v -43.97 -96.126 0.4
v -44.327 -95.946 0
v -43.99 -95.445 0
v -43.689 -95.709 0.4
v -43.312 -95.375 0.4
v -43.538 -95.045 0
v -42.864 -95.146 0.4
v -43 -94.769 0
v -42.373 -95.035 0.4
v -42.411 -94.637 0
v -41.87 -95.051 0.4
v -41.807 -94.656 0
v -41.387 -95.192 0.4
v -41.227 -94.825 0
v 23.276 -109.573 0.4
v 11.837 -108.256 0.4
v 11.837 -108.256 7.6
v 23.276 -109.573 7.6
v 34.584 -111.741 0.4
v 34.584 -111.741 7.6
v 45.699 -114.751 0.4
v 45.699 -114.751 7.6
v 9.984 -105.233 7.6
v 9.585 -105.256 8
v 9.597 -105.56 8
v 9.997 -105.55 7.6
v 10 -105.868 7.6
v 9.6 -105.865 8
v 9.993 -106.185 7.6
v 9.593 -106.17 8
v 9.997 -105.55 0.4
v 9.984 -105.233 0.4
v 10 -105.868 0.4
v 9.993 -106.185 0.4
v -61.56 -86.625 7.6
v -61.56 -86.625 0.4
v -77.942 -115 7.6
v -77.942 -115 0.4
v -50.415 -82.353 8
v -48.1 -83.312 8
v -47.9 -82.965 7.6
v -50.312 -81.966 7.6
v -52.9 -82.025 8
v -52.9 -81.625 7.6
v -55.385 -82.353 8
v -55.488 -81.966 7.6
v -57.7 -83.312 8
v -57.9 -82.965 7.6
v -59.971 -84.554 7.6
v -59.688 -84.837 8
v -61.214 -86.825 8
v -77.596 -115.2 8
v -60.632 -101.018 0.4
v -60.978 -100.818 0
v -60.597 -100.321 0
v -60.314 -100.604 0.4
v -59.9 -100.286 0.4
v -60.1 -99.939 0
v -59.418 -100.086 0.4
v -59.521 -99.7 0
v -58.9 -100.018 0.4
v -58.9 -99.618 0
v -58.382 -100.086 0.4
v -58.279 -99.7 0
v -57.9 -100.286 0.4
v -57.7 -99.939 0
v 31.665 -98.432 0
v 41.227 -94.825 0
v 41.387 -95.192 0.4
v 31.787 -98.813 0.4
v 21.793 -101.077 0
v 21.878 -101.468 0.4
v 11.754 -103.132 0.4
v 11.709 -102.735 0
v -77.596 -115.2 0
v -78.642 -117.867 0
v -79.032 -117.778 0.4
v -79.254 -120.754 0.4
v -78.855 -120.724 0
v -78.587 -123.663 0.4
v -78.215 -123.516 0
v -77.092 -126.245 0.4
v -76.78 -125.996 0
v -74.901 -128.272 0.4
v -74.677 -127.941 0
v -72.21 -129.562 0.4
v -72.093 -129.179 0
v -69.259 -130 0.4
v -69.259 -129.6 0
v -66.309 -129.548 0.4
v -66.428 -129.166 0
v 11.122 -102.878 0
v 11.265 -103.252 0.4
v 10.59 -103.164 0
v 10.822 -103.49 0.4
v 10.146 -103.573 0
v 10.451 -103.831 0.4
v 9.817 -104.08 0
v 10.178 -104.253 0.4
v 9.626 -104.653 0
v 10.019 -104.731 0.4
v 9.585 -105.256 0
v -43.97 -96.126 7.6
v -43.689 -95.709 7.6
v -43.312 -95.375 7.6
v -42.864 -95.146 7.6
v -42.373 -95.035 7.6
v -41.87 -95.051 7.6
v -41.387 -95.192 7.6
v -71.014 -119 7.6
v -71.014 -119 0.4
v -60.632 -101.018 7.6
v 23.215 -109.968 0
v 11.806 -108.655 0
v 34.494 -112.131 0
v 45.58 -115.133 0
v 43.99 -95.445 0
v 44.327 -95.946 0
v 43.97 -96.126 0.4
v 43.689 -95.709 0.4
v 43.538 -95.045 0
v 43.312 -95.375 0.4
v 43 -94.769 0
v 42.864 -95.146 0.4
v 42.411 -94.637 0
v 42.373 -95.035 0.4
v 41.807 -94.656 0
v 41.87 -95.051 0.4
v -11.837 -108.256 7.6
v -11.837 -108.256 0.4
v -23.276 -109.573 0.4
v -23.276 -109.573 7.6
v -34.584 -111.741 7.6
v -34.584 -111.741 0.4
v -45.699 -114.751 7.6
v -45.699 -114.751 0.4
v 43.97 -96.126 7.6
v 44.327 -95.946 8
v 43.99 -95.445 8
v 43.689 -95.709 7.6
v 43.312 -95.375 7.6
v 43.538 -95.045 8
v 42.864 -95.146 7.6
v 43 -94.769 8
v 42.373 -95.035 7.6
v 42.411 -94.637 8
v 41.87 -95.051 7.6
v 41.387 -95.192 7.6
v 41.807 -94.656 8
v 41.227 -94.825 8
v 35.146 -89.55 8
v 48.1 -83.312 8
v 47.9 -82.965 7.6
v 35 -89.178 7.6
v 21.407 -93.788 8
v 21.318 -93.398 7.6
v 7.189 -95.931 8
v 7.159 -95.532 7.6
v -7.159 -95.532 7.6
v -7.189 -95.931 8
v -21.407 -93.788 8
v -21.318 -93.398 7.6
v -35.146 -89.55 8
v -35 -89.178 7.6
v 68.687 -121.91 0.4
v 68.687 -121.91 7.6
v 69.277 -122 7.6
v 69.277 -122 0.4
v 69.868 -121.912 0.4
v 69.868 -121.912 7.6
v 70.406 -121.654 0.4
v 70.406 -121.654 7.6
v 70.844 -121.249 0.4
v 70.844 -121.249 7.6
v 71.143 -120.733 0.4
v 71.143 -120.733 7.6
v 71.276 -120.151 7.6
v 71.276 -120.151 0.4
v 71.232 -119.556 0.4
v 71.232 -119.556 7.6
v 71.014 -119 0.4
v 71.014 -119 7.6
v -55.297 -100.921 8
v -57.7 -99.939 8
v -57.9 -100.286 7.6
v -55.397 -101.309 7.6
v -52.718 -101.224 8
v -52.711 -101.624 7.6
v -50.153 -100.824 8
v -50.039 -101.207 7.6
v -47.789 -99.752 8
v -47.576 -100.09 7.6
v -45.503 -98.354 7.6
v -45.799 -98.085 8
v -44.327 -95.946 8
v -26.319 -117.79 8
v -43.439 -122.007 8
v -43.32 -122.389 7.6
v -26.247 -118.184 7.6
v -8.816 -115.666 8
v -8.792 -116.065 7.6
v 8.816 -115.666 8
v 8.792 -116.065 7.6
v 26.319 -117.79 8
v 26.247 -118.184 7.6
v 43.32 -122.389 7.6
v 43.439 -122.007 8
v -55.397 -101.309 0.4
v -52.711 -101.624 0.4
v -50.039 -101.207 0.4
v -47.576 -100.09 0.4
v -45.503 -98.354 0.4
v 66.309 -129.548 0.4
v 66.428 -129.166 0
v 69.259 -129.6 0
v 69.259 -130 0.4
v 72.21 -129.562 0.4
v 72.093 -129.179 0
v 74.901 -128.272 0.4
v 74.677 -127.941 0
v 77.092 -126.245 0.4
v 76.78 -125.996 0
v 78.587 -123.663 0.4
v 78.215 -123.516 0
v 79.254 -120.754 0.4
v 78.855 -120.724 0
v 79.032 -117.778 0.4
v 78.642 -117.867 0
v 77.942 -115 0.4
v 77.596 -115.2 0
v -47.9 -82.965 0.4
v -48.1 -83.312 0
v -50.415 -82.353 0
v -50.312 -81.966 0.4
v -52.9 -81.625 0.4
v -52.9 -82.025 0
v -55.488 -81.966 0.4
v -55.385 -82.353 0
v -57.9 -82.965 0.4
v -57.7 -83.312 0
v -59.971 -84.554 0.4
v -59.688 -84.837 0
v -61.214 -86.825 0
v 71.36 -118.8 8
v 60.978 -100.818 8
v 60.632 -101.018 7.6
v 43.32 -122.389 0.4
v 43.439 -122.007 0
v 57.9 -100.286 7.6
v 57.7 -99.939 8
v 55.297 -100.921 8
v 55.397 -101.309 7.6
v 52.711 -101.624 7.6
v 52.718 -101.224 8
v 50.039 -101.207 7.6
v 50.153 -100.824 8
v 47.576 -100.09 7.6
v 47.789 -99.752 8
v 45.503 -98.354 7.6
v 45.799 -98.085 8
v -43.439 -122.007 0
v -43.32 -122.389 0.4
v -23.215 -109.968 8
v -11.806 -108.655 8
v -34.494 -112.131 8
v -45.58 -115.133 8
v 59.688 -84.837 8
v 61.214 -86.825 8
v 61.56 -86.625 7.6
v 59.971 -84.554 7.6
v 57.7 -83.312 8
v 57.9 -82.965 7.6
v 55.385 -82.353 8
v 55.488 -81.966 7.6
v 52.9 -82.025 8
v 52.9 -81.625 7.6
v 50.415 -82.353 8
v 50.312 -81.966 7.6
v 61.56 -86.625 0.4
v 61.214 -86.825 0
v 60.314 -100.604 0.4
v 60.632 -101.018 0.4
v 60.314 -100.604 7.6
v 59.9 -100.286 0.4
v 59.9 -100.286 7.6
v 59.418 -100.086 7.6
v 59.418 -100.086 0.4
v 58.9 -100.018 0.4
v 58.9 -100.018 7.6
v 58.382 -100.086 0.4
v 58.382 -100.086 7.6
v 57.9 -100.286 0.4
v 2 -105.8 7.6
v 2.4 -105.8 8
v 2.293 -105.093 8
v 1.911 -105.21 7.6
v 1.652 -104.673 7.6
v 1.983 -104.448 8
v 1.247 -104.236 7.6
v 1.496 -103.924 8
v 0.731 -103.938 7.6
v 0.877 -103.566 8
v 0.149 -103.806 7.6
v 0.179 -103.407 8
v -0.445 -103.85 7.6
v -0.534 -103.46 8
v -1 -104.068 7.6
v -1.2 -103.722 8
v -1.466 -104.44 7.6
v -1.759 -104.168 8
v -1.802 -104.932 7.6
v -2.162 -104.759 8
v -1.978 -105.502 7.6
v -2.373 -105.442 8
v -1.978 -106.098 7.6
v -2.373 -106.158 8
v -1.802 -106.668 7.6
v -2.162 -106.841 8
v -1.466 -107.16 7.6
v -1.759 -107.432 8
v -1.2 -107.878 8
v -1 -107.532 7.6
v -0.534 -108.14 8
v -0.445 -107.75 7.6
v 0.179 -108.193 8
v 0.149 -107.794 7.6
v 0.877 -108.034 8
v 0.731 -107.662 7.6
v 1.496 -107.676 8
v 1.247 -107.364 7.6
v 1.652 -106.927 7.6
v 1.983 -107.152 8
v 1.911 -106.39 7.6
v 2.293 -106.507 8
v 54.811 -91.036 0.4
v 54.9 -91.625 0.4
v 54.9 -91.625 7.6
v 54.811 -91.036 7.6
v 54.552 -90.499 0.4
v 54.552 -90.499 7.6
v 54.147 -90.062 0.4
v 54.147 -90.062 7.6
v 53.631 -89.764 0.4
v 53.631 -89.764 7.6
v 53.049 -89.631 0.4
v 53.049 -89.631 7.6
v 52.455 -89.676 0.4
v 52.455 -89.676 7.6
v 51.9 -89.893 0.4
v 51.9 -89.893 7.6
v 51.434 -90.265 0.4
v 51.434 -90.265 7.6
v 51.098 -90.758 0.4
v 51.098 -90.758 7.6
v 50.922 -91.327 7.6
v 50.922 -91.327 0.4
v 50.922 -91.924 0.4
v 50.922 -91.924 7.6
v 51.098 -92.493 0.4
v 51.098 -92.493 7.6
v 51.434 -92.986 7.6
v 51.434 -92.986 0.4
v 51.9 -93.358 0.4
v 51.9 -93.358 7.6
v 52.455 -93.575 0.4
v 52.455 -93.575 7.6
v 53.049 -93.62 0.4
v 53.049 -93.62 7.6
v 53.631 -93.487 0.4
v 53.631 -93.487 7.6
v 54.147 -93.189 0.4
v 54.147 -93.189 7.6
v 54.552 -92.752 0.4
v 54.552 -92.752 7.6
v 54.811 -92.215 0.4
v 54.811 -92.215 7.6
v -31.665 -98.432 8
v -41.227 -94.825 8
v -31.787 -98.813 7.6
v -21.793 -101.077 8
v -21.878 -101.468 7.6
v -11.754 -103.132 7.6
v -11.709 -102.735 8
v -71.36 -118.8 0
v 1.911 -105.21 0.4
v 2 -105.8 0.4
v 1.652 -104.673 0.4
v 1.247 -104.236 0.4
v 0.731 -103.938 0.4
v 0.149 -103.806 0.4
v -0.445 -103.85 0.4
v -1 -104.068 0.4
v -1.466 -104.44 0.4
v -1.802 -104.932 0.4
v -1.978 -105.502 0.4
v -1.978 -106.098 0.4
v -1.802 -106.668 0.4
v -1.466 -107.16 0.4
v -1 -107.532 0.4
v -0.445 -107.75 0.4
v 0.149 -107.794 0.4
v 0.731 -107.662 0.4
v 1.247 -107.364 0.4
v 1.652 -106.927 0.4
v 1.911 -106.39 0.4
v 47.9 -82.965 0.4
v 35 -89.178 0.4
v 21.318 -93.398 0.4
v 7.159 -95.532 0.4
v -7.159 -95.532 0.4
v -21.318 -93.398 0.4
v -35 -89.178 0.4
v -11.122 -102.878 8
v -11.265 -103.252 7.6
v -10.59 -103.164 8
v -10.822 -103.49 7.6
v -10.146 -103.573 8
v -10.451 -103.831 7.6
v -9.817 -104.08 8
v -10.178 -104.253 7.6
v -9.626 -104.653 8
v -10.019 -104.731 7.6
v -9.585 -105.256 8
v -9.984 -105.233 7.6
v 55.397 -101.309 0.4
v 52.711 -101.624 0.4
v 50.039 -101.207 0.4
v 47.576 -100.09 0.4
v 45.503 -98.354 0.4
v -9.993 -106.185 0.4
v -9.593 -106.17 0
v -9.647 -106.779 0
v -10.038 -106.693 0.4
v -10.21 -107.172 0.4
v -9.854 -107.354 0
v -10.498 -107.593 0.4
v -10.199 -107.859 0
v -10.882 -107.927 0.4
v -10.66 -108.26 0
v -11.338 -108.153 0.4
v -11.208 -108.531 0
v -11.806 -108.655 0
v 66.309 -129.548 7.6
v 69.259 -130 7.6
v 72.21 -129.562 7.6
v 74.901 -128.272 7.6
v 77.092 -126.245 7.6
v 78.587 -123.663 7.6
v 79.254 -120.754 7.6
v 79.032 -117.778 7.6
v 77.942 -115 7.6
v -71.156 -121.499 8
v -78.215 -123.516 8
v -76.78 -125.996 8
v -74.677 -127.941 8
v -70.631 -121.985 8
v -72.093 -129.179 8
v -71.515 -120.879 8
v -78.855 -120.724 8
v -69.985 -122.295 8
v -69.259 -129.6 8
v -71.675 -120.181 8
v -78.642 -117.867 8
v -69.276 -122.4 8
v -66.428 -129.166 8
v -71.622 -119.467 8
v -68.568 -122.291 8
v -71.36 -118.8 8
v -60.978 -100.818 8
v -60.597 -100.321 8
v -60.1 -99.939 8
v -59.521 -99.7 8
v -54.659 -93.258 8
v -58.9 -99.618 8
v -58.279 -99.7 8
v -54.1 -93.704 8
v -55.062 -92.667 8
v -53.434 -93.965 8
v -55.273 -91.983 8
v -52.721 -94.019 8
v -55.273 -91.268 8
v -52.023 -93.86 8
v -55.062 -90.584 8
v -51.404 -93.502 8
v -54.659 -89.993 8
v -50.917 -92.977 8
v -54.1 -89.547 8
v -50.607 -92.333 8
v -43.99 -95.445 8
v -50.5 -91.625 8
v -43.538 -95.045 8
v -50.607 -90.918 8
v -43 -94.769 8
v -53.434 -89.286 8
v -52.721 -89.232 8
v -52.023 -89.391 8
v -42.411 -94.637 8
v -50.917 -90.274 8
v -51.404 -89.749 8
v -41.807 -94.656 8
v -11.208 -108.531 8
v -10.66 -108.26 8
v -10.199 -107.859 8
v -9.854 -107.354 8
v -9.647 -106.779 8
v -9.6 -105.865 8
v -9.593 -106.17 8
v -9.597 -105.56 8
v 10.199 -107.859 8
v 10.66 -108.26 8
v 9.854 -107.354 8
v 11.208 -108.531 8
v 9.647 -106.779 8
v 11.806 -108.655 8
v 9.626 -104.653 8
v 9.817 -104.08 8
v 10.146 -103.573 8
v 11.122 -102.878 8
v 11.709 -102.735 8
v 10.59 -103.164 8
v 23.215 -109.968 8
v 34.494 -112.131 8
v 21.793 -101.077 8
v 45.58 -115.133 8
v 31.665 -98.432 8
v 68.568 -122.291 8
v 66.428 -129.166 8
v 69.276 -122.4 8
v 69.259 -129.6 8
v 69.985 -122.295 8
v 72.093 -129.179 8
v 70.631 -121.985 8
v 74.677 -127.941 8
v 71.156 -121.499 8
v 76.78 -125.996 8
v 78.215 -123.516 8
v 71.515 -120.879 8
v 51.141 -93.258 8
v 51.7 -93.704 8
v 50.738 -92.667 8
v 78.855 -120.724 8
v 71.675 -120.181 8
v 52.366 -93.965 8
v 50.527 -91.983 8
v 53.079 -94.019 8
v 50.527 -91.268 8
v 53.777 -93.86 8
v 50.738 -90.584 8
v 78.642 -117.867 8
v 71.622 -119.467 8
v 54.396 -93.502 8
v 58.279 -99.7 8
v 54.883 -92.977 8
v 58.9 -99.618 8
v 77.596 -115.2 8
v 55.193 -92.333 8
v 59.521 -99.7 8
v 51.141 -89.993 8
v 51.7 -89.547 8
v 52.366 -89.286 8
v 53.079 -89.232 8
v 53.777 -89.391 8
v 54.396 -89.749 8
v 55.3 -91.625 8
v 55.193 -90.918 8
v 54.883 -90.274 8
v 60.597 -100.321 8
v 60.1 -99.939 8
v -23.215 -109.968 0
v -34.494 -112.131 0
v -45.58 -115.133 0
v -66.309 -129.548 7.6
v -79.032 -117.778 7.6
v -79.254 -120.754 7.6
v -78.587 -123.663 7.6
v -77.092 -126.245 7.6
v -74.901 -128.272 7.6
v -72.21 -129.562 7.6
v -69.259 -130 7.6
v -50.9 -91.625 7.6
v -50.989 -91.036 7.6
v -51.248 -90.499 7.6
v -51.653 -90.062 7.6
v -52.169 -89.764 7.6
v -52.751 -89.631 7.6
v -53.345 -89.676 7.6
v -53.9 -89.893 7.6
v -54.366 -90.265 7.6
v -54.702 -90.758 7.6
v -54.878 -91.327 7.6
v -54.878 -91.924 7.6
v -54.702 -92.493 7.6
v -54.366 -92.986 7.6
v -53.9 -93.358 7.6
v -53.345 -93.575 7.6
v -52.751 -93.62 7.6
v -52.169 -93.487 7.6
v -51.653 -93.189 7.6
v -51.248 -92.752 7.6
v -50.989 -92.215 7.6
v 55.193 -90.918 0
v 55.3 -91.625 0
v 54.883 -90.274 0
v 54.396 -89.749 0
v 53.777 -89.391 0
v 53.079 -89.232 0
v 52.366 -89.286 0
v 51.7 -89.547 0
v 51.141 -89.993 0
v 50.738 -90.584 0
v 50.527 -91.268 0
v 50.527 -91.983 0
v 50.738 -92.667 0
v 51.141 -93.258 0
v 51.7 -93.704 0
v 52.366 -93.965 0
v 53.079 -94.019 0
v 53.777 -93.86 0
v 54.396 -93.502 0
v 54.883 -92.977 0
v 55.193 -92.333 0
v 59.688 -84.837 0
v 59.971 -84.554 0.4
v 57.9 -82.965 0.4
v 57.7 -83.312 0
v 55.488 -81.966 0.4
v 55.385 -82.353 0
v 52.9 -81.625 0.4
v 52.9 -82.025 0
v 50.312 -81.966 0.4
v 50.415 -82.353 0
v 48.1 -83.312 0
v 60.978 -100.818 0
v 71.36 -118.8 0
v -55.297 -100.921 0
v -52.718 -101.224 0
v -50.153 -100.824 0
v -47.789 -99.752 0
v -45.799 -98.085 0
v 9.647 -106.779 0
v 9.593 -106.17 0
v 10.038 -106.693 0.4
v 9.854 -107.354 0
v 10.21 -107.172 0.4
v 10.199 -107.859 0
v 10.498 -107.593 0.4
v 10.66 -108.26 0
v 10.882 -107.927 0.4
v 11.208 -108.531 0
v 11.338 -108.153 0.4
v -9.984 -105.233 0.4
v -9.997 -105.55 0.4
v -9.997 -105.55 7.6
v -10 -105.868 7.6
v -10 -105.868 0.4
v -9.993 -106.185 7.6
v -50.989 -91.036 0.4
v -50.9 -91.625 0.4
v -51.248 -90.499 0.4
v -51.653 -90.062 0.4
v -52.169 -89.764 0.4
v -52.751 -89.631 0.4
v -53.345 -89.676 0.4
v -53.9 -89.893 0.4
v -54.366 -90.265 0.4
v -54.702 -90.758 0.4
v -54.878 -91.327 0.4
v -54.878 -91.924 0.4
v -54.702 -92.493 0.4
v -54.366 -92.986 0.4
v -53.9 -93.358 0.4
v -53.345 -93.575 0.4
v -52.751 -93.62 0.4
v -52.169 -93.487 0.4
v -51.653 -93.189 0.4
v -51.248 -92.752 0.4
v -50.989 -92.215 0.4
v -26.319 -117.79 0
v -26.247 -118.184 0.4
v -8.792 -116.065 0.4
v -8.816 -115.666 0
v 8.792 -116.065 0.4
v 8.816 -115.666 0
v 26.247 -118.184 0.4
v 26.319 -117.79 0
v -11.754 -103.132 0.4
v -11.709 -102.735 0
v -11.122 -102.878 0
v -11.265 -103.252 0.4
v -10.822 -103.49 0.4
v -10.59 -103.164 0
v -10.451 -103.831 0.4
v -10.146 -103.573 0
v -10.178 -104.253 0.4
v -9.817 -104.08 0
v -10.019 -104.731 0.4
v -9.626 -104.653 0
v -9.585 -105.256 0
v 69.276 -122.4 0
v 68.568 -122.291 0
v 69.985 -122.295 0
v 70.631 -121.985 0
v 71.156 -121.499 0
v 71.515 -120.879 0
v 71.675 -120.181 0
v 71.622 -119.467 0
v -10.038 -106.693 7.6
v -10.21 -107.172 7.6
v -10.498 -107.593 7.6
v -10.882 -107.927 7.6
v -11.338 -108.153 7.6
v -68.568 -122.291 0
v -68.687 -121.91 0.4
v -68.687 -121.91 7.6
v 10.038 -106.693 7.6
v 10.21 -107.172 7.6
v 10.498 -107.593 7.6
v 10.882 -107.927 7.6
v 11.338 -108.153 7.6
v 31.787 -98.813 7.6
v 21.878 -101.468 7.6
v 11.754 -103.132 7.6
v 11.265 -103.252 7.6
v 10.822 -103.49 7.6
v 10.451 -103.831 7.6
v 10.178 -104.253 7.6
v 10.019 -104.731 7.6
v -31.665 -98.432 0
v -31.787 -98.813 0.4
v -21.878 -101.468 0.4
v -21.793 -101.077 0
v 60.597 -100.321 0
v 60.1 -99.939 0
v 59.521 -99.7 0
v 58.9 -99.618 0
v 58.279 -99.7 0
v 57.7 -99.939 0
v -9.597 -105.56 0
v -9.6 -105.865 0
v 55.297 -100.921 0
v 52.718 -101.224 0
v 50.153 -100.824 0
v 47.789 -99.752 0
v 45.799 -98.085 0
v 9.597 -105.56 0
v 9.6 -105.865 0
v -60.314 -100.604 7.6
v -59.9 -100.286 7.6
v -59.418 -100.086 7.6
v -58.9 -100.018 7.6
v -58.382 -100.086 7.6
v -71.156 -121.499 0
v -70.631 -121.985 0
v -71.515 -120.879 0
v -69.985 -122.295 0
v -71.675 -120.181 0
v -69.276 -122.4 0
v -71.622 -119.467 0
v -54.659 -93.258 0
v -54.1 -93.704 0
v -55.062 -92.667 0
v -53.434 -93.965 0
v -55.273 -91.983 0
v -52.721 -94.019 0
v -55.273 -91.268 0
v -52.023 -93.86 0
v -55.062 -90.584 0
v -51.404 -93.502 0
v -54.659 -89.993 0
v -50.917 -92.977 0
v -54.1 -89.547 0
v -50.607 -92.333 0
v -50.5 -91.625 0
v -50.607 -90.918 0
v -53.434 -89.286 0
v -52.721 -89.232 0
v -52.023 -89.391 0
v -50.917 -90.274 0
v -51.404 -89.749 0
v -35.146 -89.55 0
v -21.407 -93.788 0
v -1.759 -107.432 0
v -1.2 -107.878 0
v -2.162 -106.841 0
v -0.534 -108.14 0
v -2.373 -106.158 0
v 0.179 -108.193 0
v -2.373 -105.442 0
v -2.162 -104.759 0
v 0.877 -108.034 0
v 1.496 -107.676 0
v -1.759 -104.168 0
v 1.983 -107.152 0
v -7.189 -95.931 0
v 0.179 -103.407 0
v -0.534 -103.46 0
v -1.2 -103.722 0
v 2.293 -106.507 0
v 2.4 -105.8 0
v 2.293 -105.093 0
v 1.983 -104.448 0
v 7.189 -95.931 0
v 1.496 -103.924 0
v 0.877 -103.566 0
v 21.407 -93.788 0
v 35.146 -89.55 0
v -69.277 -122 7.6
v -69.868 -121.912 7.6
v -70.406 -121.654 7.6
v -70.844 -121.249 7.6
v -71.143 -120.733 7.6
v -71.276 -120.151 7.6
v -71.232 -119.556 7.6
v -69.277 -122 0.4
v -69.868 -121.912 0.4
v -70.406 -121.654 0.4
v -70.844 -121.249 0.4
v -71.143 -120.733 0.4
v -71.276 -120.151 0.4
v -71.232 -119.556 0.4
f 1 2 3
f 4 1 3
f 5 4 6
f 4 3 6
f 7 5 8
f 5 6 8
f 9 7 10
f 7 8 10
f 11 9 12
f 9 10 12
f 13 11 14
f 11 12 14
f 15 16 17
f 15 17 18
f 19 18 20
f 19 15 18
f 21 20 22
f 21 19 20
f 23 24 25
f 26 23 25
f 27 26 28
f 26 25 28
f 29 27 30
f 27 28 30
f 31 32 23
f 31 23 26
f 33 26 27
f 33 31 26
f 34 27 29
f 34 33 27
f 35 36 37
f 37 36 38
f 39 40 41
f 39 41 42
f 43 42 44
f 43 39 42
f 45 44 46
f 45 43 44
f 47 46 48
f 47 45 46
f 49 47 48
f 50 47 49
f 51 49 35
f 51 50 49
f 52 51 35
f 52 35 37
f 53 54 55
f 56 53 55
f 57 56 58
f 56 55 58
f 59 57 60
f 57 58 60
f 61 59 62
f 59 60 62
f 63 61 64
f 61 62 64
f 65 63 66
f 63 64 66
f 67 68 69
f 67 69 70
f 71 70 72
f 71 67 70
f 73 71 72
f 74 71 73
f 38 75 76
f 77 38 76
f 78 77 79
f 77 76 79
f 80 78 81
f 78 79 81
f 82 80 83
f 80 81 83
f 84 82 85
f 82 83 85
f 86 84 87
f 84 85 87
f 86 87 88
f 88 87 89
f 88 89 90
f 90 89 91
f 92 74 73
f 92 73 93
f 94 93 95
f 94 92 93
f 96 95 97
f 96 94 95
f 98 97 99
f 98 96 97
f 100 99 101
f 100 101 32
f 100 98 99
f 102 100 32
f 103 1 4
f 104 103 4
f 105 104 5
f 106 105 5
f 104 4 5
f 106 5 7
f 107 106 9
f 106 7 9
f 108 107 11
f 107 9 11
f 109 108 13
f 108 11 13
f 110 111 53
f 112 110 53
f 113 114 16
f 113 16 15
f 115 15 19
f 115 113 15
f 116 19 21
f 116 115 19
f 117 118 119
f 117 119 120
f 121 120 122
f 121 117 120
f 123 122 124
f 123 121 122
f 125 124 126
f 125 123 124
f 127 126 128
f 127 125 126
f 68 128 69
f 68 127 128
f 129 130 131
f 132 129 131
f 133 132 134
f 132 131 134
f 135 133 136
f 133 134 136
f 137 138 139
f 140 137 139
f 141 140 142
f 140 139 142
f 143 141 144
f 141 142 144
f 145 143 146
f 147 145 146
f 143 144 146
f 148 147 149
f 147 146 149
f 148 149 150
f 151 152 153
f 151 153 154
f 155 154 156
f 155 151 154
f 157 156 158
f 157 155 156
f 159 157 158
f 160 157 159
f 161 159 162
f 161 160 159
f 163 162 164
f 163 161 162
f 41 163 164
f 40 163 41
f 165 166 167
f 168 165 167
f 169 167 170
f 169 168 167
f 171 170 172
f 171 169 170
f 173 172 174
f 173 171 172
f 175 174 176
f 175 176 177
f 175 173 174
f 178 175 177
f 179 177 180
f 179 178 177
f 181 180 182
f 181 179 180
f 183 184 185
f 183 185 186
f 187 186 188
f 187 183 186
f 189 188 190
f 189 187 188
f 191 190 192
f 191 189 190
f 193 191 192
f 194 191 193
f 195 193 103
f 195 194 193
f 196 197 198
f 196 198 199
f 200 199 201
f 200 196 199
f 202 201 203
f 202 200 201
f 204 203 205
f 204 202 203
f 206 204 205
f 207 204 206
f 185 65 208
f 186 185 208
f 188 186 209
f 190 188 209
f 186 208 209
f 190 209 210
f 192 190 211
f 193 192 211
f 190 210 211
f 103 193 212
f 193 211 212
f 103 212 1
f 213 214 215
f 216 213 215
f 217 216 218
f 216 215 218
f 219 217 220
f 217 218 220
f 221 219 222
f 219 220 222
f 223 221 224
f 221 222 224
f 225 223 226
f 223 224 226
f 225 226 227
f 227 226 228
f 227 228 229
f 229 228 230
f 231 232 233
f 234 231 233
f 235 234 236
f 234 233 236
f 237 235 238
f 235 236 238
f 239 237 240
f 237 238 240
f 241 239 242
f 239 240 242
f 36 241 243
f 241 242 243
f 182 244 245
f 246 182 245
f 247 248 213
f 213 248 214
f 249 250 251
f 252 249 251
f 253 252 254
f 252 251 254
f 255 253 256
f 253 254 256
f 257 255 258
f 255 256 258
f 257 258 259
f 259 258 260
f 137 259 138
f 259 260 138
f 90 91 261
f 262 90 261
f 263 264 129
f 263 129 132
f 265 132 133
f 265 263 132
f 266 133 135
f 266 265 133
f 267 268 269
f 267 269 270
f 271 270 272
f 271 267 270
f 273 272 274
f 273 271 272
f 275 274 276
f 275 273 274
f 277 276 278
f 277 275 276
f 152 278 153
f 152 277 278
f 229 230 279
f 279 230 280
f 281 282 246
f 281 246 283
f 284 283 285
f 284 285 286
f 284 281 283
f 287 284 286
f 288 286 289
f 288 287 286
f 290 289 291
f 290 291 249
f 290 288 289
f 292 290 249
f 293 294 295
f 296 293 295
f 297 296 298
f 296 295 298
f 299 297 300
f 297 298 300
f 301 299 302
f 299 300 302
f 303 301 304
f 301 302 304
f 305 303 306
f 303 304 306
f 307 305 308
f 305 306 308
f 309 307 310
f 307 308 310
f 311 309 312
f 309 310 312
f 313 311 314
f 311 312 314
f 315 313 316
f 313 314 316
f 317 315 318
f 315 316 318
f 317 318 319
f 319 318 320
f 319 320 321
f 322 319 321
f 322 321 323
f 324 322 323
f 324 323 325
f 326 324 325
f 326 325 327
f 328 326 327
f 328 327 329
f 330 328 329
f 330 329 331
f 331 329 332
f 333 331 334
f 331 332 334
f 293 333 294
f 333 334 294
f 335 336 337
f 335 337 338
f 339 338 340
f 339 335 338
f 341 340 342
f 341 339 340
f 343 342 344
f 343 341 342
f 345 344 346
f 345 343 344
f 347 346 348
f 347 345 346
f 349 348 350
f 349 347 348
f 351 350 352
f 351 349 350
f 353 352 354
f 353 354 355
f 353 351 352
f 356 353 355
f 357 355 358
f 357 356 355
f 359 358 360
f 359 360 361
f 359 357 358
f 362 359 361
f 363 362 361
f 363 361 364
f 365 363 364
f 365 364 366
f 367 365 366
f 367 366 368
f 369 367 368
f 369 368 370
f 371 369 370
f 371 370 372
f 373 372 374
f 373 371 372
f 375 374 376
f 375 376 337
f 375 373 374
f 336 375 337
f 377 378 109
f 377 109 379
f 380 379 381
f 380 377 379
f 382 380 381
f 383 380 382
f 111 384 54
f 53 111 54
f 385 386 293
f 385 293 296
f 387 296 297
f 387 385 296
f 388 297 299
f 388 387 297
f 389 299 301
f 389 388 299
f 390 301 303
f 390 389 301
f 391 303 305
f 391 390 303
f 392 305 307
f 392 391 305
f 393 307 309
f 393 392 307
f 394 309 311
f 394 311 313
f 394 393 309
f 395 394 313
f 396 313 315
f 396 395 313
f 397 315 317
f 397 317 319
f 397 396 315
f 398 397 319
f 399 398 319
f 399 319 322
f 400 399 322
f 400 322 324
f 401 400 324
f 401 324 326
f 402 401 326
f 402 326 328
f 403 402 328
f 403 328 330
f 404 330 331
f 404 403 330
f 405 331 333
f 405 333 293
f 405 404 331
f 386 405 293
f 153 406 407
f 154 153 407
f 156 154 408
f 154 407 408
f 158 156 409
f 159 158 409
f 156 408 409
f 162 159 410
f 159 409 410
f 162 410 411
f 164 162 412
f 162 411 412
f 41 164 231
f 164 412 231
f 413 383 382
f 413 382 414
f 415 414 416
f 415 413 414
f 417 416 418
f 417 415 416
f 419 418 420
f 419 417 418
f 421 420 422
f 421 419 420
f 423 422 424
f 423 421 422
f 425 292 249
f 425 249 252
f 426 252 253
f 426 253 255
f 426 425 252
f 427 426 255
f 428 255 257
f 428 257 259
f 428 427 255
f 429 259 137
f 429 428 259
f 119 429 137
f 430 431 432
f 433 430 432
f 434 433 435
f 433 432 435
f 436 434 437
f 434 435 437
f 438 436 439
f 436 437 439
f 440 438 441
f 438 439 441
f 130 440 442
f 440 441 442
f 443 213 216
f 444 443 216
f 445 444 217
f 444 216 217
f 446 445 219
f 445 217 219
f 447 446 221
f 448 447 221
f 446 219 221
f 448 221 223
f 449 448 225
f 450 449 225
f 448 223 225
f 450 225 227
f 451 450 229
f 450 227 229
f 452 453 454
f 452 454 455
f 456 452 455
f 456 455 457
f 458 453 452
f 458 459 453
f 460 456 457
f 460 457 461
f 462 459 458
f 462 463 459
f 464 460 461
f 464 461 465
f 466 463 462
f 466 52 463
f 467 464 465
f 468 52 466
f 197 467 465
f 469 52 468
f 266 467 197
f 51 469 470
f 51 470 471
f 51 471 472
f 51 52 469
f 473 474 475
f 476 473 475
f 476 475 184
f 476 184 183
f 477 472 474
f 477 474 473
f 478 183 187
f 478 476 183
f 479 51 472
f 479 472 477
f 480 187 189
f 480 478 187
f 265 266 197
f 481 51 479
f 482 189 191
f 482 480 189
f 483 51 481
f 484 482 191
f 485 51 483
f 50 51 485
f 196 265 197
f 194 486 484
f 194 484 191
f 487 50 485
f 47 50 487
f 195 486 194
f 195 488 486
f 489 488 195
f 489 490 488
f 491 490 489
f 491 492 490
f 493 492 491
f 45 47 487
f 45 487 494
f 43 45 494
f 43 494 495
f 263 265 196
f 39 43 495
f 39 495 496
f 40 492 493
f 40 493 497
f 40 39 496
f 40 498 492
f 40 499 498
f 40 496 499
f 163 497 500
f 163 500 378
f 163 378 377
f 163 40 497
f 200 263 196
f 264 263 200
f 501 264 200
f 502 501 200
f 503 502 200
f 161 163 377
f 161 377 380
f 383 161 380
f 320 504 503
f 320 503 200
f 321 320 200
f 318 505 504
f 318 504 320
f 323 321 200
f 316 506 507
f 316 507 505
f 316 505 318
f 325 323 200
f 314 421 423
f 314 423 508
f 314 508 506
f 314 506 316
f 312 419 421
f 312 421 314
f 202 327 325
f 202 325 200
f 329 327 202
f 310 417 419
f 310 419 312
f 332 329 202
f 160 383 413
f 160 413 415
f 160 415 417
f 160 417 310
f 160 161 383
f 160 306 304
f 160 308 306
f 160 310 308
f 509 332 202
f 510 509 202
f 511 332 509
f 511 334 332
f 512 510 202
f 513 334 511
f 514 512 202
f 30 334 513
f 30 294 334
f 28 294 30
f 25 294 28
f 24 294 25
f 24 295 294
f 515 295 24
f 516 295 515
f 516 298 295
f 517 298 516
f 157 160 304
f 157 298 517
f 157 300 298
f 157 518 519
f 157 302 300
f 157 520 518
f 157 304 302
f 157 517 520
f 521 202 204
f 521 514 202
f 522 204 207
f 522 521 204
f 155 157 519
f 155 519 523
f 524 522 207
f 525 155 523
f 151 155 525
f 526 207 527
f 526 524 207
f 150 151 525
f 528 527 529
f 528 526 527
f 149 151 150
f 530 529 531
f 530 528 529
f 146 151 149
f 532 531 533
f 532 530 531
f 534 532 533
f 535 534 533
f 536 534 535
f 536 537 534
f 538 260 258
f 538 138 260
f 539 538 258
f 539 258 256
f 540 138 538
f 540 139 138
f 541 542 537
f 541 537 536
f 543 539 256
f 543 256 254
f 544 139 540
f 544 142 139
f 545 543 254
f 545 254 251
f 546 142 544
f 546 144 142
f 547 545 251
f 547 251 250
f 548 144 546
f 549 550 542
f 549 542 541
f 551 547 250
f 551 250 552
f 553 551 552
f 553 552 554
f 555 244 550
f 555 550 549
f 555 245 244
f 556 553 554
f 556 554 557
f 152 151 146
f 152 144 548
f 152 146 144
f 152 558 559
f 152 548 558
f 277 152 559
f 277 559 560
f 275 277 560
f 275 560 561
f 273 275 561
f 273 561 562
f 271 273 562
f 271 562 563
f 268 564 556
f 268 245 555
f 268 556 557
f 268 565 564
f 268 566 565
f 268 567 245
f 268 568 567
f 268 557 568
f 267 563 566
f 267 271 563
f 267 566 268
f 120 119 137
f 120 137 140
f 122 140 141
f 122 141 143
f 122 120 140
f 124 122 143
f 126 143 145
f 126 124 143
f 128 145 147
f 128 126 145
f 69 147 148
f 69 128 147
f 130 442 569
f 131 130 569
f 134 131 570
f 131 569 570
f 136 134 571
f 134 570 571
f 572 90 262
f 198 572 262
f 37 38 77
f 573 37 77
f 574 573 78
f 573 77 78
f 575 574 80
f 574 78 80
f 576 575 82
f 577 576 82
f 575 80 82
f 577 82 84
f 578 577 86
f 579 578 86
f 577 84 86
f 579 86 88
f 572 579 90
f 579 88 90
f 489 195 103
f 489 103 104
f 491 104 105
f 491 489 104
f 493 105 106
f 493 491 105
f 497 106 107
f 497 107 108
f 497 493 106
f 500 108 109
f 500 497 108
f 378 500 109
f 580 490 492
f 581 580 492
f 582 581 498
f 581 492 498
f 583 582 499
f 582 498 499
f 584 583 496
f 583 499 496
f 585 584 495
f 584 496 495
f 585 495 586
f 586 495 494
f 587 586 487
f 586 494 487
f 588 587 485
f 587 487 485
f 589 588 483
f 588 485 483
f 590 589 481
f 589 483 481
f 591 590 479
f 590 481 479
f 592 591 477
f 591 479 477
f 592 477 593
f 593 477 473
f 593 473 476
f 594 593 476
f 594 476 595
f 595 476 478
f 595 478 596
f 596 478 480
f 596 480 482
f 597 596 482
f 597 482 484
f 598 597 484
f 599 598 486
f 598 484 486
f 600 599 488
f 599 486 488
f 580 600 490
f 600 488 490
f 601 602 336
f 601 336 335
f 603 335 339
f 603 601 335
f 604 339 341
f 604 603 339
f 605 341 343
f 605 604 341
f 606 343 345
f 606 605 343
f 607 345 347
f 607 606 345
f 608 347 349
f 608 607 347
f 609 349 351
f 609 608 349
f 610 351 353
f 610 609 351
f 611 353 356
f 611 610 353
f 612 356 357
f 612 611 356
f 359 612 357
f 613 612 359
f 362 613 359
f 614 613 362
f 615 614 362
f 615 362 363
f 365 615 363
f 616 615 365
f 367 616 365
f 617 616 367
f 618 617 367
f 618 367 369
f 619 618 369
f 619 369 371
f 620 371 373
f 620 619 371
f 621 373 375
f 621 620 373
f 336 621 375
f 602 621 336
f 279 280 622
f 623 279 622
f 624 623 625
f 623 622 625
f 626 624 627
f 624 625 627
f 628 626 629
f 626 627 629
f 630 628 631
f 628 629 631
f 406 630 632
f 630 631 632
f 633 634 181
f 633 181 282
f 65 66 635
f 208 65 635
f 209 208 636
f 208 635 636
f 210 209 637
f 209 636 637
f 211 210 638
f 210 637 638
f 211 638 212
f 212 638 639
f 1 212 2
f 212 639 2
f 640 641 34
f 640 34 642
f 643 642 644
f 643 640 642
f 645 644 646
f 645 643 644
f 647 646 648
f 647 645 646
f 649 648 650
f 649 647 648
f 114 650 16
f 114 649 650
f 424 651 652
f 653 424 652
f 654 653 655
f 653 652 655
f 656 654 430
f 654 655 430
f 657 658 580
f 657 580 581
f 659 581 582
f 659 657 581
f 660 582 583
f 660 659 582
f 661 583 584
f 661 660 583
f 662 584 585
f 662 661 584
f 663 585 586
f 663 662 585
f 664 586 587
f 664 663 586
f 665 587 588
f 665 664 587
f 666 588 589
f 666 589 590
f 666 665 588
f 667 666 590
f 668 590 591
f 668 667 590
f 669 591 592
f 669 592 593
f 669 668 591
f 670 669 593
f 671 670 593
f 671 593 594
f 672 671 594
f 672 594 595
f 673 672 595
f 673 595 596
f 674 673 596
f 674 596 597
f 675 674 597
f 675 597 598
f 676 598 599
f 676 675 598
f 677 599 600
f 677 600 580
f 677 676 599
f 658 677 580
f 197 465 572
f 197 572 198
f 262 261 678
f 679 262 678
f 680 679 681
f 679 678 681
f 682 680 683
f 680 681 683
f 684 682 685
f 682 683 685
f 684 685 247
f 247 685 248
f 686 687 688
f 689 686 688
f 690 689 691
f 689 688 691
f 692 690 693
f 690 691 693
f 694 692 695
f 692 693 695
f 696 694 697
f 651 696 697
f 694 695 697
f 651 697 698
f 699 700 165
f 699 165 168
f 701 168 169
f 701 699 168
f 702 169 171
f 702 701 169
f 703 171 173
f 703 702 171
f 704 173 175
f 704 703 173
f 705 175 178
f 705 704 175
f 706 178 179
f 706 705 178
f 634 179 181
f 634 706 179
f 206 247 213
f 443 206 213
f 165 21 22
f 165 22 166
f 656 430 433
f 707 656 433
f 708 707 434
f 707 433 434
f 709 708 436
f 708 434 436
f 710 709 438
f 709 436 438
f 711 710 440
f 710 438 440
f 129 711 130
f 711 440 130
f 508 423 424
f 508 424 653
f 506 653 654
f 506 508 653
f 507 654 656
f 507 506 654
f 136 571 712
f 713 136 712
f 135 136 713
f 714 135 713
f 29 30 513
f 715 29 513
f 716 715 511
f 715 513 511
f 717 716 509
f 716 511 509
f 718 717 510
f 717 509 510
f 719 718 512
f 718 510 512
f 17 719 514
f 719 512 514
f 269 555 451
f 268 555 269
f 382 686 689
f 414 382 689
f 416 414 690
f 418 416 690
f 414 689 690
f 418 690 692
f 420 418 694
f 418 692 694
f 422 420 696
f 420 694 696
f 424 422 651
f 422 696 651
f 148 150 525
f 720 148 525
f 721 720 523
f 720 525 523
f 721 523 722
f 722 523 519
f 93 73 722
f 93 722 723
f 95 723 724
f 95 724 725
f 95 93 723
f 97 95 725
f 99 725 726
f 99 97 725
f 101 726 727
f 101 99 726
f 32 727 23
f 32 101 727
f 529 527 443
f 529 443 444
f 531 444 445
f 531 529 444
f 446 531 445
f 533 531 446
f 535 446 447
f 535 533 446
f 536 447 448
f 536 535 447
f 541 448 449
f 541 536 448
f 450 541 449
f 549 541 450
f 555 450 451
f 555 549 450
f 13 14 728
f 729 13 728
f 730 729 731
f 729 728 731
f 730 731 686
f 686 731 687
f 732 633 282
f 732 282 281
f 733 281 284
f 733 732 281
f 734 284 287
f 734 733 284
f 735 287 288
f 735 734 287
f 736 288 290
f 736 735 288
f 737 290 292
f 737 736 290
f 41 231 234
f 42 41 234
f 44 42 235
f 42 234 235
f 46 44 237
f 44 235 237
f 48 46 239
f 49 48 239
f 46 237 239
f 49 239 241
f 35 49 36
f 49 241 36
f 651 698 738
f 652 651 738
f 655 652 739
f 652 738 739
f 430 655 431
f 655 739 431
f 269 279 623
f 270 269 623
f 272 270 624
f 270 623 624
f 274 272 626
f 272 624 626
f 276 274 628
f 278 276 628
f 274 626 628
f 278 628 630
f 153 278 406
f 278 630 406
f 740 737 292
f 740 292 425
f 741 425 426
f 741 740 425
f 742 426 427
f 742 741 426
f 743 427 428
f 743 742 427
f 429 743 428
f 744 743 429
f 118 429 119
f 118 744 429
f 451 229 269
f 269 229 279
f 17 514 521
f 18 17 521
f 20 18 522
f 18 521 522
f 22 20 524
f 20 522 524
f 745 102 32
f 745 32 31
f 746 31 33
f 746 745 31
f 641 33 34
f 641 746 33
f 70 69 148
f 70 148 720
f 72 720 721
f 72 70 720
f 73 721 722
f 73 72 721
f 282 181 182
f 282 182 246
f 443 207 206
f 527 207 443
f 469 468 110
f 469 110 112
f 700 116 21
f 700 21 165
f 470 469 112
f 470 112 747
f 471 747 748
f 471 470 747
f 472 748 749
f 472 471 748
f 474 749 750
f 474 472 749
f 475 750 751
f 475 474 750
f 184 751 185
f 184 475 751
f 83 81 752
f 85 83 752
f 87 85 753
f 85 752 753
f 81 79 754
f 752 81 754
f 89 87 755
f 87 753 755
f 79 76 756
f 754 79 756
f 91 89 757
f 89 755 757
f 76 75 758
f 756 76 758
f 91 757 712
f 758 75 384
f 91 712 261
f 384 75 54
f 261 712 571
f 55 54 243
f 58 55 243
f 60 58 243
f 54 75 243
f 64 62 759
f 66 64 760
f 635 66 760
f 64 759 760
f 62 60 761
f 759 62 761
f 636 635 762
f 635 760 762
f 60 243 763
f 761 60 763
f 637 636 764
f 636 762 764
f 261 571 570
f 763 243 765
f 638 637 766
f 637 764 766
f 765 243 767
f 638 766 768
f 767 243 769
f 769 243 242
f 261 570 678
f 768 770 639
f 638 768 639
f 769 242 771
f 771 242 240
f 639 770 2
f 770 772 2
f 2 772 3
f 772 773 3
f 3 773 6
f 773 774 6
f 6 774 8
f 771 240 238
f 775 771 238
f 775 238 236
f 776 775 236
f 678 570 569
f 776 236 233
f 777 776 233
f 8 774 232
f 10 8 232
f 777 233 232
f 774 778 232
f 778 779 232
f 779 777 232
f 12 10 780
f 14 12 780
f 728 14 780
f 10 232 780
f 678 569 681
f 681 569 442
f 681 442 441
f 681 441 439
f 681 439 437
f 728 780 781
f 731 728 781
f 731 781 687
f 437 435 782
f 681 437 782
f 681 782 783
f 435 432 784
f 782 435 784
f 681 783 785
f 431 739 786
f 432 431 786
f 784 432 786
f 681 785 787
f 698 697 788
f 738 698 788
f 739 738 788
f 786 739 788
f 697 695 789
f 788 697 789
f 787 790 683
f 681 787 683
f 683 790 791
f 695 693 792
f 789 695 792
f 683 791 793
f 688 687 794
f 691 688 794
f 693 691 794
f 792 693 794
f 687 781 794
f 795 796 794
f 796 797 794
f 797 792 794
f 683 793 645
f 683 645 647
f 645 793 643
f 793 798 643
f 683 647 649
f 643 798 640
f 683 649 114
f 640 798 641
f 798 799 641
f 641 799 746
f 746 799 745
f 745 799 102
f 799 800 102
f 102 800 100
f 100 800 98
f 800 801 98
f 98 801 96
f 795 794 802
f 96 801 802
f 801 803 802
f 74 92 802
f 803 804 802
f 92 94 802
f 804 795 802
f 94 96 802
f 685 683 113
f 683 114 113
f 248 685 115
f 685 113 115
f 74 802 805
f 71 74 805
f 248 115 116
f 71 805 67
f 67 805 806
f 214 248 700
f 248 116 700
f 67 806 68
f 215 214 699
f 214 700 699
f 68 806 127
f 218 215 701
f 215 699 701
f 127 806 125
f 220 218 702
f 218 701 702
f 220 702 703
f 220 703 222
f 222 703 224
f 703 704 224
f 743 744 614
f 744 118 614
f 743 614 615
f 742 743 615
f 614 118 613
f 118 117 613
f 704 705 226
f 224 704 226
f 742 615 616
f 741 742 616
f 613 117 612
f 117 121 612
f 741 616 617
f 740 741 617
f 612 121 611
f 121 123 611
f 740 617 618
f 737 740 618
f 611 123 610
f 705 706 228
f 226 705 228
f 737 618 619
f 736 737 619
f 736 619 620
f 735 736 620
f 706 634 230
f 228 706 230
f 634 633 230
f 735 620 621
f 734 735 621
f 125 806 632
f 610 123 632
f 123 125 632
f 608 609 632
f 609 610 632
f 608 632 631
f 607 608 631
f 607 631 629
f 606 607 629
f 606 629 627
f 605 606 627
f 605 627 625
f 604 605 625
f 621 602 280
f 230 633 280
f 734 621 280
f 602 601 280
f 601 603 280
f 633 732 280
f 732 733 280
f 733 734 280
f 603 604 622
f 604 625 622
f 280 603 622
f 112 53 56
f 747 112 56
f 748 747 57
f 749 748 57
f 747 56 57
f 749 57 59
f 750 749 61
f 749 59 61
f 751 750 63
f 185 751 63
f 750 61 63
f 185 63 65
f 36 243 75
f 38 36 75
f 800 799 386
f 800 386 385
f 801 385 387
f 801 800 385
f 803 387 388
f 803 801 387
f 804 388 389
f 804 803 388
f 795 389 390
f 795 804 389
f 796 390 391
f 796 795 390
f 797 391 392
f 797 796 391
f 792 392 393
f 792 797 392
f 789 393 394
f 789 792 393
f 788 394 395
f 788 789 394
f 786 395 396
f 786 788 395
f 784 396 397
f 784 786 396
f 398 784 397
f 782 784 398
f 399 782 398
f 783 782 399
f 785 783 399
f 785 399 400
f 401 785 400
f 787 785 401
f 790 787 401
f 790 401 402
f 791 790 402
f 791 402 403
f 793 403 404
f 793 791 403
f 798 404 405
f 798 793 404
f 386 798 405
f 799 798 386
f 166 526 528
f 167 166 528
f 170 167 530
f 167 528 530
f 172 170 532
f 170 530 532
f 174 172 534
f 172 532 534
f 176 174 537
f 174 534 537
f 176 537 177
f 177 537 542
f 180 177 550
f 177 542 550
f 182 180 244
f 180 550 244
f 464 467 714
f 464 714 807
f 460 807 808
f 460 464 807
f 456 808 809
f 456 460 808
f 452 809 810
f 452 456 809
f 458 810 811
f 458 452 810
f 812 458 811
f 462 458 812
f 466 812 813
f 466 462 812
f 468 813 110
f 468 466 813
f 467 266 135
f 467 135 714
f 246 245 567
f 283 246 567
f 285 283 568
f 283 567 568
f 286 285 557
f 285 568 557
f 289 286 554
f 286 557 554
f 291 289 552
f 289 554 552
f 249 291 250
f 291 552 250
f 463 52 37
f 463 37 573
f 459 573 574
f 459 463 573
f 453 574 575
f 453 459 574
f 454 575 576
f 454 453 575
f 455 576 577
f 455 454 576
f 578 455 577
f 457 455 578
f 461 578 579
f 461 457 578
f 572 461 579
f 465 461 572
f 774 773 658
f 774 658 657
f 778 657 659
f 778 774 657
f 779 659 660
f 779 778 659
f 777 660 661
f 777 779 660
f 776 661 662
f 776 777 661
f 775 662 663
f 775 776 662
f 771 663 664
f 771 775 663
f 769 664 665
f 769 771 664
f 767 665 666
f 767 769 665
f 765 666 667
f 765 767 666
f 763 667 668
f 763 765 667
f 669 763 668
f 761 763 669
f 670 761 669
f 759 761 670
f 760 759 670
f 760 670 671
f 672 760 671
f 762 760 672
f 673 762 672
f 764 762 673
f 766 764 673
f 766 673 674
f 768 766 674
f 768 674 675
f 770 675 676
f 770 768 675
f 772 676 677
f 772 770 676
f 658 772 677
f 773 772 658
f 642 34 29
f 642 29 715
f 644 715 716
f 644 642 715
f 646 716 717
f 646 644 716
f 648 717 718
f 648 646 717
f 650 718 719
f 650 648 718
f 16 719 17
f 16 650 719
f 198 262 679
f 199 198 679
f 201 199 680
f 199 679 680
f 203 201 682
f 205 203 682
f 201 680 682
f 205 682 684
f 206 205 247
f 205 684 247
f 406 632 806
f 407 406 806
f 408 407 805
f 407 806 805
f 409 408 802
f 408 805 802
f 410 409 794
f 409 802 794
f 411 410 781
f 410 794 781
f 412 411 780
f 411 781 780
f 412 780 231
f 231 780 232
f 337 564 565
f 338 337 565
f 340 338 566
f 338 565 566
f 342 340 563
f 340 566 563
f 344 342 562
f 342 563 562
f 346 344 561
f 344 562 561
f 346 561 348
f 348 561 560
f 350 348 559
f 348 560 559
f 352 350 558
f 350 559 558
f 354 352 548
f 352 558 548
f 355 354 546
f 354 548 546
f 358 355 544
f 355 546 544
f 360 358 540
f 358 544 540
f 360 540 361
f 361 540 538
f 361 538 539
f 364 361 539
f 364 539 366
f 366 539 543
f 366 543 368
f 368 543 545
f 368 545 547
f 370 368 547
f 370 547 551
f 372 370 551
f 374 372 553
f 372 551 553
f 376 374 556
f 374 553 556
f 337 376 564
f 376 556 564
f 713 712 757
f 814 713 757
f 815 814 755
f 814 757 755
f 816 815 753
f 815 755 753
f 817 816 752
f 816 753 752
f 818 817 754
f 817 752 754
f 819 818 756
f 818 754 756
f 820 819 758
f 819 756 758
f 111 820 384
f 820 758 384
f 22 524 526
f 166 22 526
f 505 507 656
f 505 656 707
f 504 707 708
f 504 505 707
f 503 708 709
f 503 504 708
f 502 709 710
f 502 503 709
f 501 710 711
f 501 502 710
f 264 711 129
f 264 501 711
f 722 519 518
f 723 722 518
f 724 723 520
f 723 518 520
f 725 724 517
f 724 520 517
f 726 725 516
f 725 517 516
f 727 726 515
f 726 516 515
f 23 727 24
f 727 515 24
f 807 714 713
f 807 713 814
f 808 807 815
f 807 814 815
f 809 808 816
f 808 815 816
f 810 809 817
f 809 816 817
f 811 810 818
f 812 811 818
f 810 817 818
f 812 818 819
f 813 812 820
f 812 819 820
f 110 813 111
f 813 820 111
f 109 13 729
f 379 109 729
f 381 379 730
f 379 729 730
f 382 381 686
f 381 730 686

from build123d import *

# Parameters (mm, degrees)
SKETCH1_R           = 2
BOSS_EXTRUDE1_DEPTH = 8
CHAMFER1_SIZE       = 0.4


with BuildPart() as part:
    # Sketch1 → Boss-Extrude1 (new body)
    with BuildSketch(Plane.XY):
        with BuildLine():
            Line((-66.308814514, -129.547773352), (-43.320112037, -122.388992281))
            ThreePointArc((-43.320112037, -122.388992281), (0, -115.8), (43.320112037, -122.388992281))
            Line((43.320112037, -122.388992281), (66.308814514, -129.547773352))
            ThreePointArc((66.308814514, -129.547773352), (77.091963333, -126.245396489), (77.942286341, -115))
            Line((77.942286341, -115), (61.560254038, -86.62548772))
            ThreePointArc((61.560254038, -86.62548772), (55.488190451, -81.966229458), (47.9, -82.965233683))
            ThreePointArc((47.9, -82.965233683), (0, -95.8), (-47.9, -82.965233683))
            ThreePointArc((-47.9, -82.965233683), (-55.488190451, -81.966229458), (-61.560254038, -86.62548772))
            Line((-61.560254038, -86.62548772), (-77.942286341, -115))
            ThreePointArc((-77.942286341, -115), (-77.091963333, -126.245396489), (-66.308814514, -129.547773352))
        make_face()
        with Locations((-52.9, -91.62548772)):
            Circle(SKETCH1_R, mode=Mode.SUBTRACT)
        with Locations((0, -105.8)):
            Circle(SKETCH1_R, mode=Mode.SUBTRACT)
        with Locations((52.9, -91.62548772)):
            Circle(SKETCH1_R, mode=Mode.SUBTRACT)
        with BuildLine():
            Line((-71.01408311, -119), (-60.632050808, -101.017792566))
            ThreePointArc((-60.632050808, -101.017792566), (-59.41763809, -100.085940913), (-57.9, -100.285741758))
            ThreePointArc((-57.9, -100.285741758), (-50.03884881, -101.207440229), (-43.970129475, -96.126311247))
            ThreePointArc((-43.970129475, -96.126311247), (-42.86414468, -95.145621216), (-41.386723322, -95.192327068))
            ThreePointArc((-41.386723322, -95.192327068), (-26.865416882, -100.263100769), (-11.754209758, -103.132335147))
            ThreePointArc((-11.754209758, -103.132335147), (-10.451372404, -103.830597372), (-9.98390649, -105.23289225))
            ThreePointArc((-9.98390649, -105.23289225), (-9.999586121, -105.709019747), (-9.992572367, -106.185353717))
            ThreePointArc((-9.992572367, -106.185353717), (-10.497515805, -107.592554365), (-11.837059844, -108.256484561))
            ThreePointArc((-11.837059844, -108.256484561), (-28.950552114, -110.551129126), (-45.698686268, -114.750773599))
            Line((-45.698686268, -114.750773599), (-68.687388745, -121.90955467))
            ThreePointArc((-68.687388745, -121.90955467), (-70.844018509, -121.249079298), (-71.01408311, -119))
        make_face(mode=Mode.SUBTRACT)
        with BuildLine():
            Line((71.01408311, -119), (60.632050808, -101.017792566))
            ThreePointArc((60.632050808, -101.017792566), (59.41763809, -100.085940913), (57.9, -100.285741758))
            ThreePointArc((57.9, -100.285741758), (50.03884881, -101.207440229), (43.970129475, -96.126311247))
            ThreePointArc((43.970129475, -96.126311247), (42.86414468, -95.145621216), (41.386723322, -95.192327068))
            ThreePointArc((41.386723322, -95.192327068), (26.865416882, -100.263100769), (11.754209758, -103.132335147))
            ThreePointArc((11.754209758, -103.132335147), (10.451372404, -103.830597372), (9.98390649, -105.23289225))
            ThreePointArc((9.98390649, -105.23289225), (9.999586121, -105.709019747), (9.992572367, -106.185353717))
            ThreePointArc((9.992572367, -106.185353717), (10.497515805, -107.592554365), (11.837059844, -108.256484561))
            ThreePointArc((11.837059844, -108.256484561), (28.950552114, -110.551129126), (45.698686268, -114.750773599))
            Line((45.698686268, -114.750773599), (68.687388745, -121.90955467))
            ThreePointArc((68.687388745, -121.90955467), (70.844018509, -121.249079298), (71.01408311, -119))
        make_face(mode=Mode.SUBTRACT)
    extrude(amount=BOSS_EXTRUDE1_DEPTH)

    # Chamfer1
    chamfer1_edges = [part.edges().sort_by_distance(p)[0] for p in [
        (-69.751270189, -100.81274386, 0),
        (-55.488190451, -81.966229458, 0),
        (0, -95.8, 0),
        (55.488190451, -81.966229458, 0),
        (69.751270189, -100.81274386, 0),
        (77.091963333, -126.245396489, 0),
        (54.814463276, -125.968382816, 0),
        (0, -115.8, 8),
        (0, -115.8, 0),
        (-54.814463276, -125.968382816, 0),
        (-77.091963333, -126.245396489, 0),
        (54.814463276, -125.968382816, 8),
        (77.091963333, -126.245396489, 8),
        (69.751270189, -100.81274386, 8),
        (-54.9, -91.62548772, 0),
        (-54.9, -91.62548772, 8),
        (55.488190451, -81.966229458, 8),
        (-2, -105.8, 0),
        (-2, -105.8, 8),
        (0, -95.8, 8),
        (50.9, -91.62548772, 0),
        (50.9, -91.62548772, 8),
        (-55.488190451, -81.966229458, 8),
        (-69.751270189, -100.81274386, 8),
        (-70.844018509, -121.249079298, 0),
        (-57.193037507, -118.330164135, 0),
        (-28.950552114, -110.551129126, 0),
        (-10.497515805, -107.592554365, 0),
        (-9.999586121, -105.709019747, 0),
        (-10.451372404, -103.830597372, 0),
        (-26.865416882, -100.263100769, 0),
        (-42.86414468, -95.145621216, 0),
        (-50.03884881, -101.207440229, 0),
        (-59.41763809, -100.085940913, 0),
        (-77.091963333, -126.245396489, 8),
        (-65.823066959, -110.008896283, 0),
        (-70.844018509, -121.249079298, 8),
        (-57.193037507, -118.330164135, 8),
        (-28.950552114, -110.551129126, 8),
        (-10.497515805, -107.592554365, 8),
        (-9.999586121, -105.709019747, 8),
        (-10.451372404, -103.830597372, 8),
        (-26.865416882, -100.263100769, 8),
        (-42.86414468, -95.145621216, 8),
        (-50.03884881, -101.207440229, 8),
        (-59.41763809, -100.085940913, 8),
        (-65.823066959, -110.008896283, 8),
        (28.950552114, -110.551129126, 0),
        (57.193037507, -118.330164135, 0),
        (70.844018509, -121.249079298, 0),
        (65.823066959, -110.008896283, 0),
        (59.41763809, -100.085940913, 0),
        (50.03884881, -101.207440229, 0),
        (42.86414468, -95.145621216, 0),
        (26.865416882, -100.263100769, 0),
        (10.451372404, -103.830597372, 0),
        (9.999586121, -105.709019747, 0),
        (10.497515805, -107.592554365, 0),
        (28.950552114, -110.551129126, 8),
        (57.193037507, -118.330164135, 8),
        (70.844018509, -121.249079298, 8),
        (65.823066959, -110.008896283, 8),
        (59.41763809, -100.085940913, 8),
        (50.03884881, -101.207440229, 8),
        (42.86414468, -95.145621216, 8),
        (26.865416882, -100.263100769, 8),
        (10.451372404, -103.830597372, 8),
        (9.999586121, -105.709019747, 8),
        (10.497515805, -107.592554365, 8),
        (-54.814463276, -125.968382816, 8),
    ]]
    chamfer(chamfer1_edges, length=CHAMFER1_SIZE)


solid = part.part
